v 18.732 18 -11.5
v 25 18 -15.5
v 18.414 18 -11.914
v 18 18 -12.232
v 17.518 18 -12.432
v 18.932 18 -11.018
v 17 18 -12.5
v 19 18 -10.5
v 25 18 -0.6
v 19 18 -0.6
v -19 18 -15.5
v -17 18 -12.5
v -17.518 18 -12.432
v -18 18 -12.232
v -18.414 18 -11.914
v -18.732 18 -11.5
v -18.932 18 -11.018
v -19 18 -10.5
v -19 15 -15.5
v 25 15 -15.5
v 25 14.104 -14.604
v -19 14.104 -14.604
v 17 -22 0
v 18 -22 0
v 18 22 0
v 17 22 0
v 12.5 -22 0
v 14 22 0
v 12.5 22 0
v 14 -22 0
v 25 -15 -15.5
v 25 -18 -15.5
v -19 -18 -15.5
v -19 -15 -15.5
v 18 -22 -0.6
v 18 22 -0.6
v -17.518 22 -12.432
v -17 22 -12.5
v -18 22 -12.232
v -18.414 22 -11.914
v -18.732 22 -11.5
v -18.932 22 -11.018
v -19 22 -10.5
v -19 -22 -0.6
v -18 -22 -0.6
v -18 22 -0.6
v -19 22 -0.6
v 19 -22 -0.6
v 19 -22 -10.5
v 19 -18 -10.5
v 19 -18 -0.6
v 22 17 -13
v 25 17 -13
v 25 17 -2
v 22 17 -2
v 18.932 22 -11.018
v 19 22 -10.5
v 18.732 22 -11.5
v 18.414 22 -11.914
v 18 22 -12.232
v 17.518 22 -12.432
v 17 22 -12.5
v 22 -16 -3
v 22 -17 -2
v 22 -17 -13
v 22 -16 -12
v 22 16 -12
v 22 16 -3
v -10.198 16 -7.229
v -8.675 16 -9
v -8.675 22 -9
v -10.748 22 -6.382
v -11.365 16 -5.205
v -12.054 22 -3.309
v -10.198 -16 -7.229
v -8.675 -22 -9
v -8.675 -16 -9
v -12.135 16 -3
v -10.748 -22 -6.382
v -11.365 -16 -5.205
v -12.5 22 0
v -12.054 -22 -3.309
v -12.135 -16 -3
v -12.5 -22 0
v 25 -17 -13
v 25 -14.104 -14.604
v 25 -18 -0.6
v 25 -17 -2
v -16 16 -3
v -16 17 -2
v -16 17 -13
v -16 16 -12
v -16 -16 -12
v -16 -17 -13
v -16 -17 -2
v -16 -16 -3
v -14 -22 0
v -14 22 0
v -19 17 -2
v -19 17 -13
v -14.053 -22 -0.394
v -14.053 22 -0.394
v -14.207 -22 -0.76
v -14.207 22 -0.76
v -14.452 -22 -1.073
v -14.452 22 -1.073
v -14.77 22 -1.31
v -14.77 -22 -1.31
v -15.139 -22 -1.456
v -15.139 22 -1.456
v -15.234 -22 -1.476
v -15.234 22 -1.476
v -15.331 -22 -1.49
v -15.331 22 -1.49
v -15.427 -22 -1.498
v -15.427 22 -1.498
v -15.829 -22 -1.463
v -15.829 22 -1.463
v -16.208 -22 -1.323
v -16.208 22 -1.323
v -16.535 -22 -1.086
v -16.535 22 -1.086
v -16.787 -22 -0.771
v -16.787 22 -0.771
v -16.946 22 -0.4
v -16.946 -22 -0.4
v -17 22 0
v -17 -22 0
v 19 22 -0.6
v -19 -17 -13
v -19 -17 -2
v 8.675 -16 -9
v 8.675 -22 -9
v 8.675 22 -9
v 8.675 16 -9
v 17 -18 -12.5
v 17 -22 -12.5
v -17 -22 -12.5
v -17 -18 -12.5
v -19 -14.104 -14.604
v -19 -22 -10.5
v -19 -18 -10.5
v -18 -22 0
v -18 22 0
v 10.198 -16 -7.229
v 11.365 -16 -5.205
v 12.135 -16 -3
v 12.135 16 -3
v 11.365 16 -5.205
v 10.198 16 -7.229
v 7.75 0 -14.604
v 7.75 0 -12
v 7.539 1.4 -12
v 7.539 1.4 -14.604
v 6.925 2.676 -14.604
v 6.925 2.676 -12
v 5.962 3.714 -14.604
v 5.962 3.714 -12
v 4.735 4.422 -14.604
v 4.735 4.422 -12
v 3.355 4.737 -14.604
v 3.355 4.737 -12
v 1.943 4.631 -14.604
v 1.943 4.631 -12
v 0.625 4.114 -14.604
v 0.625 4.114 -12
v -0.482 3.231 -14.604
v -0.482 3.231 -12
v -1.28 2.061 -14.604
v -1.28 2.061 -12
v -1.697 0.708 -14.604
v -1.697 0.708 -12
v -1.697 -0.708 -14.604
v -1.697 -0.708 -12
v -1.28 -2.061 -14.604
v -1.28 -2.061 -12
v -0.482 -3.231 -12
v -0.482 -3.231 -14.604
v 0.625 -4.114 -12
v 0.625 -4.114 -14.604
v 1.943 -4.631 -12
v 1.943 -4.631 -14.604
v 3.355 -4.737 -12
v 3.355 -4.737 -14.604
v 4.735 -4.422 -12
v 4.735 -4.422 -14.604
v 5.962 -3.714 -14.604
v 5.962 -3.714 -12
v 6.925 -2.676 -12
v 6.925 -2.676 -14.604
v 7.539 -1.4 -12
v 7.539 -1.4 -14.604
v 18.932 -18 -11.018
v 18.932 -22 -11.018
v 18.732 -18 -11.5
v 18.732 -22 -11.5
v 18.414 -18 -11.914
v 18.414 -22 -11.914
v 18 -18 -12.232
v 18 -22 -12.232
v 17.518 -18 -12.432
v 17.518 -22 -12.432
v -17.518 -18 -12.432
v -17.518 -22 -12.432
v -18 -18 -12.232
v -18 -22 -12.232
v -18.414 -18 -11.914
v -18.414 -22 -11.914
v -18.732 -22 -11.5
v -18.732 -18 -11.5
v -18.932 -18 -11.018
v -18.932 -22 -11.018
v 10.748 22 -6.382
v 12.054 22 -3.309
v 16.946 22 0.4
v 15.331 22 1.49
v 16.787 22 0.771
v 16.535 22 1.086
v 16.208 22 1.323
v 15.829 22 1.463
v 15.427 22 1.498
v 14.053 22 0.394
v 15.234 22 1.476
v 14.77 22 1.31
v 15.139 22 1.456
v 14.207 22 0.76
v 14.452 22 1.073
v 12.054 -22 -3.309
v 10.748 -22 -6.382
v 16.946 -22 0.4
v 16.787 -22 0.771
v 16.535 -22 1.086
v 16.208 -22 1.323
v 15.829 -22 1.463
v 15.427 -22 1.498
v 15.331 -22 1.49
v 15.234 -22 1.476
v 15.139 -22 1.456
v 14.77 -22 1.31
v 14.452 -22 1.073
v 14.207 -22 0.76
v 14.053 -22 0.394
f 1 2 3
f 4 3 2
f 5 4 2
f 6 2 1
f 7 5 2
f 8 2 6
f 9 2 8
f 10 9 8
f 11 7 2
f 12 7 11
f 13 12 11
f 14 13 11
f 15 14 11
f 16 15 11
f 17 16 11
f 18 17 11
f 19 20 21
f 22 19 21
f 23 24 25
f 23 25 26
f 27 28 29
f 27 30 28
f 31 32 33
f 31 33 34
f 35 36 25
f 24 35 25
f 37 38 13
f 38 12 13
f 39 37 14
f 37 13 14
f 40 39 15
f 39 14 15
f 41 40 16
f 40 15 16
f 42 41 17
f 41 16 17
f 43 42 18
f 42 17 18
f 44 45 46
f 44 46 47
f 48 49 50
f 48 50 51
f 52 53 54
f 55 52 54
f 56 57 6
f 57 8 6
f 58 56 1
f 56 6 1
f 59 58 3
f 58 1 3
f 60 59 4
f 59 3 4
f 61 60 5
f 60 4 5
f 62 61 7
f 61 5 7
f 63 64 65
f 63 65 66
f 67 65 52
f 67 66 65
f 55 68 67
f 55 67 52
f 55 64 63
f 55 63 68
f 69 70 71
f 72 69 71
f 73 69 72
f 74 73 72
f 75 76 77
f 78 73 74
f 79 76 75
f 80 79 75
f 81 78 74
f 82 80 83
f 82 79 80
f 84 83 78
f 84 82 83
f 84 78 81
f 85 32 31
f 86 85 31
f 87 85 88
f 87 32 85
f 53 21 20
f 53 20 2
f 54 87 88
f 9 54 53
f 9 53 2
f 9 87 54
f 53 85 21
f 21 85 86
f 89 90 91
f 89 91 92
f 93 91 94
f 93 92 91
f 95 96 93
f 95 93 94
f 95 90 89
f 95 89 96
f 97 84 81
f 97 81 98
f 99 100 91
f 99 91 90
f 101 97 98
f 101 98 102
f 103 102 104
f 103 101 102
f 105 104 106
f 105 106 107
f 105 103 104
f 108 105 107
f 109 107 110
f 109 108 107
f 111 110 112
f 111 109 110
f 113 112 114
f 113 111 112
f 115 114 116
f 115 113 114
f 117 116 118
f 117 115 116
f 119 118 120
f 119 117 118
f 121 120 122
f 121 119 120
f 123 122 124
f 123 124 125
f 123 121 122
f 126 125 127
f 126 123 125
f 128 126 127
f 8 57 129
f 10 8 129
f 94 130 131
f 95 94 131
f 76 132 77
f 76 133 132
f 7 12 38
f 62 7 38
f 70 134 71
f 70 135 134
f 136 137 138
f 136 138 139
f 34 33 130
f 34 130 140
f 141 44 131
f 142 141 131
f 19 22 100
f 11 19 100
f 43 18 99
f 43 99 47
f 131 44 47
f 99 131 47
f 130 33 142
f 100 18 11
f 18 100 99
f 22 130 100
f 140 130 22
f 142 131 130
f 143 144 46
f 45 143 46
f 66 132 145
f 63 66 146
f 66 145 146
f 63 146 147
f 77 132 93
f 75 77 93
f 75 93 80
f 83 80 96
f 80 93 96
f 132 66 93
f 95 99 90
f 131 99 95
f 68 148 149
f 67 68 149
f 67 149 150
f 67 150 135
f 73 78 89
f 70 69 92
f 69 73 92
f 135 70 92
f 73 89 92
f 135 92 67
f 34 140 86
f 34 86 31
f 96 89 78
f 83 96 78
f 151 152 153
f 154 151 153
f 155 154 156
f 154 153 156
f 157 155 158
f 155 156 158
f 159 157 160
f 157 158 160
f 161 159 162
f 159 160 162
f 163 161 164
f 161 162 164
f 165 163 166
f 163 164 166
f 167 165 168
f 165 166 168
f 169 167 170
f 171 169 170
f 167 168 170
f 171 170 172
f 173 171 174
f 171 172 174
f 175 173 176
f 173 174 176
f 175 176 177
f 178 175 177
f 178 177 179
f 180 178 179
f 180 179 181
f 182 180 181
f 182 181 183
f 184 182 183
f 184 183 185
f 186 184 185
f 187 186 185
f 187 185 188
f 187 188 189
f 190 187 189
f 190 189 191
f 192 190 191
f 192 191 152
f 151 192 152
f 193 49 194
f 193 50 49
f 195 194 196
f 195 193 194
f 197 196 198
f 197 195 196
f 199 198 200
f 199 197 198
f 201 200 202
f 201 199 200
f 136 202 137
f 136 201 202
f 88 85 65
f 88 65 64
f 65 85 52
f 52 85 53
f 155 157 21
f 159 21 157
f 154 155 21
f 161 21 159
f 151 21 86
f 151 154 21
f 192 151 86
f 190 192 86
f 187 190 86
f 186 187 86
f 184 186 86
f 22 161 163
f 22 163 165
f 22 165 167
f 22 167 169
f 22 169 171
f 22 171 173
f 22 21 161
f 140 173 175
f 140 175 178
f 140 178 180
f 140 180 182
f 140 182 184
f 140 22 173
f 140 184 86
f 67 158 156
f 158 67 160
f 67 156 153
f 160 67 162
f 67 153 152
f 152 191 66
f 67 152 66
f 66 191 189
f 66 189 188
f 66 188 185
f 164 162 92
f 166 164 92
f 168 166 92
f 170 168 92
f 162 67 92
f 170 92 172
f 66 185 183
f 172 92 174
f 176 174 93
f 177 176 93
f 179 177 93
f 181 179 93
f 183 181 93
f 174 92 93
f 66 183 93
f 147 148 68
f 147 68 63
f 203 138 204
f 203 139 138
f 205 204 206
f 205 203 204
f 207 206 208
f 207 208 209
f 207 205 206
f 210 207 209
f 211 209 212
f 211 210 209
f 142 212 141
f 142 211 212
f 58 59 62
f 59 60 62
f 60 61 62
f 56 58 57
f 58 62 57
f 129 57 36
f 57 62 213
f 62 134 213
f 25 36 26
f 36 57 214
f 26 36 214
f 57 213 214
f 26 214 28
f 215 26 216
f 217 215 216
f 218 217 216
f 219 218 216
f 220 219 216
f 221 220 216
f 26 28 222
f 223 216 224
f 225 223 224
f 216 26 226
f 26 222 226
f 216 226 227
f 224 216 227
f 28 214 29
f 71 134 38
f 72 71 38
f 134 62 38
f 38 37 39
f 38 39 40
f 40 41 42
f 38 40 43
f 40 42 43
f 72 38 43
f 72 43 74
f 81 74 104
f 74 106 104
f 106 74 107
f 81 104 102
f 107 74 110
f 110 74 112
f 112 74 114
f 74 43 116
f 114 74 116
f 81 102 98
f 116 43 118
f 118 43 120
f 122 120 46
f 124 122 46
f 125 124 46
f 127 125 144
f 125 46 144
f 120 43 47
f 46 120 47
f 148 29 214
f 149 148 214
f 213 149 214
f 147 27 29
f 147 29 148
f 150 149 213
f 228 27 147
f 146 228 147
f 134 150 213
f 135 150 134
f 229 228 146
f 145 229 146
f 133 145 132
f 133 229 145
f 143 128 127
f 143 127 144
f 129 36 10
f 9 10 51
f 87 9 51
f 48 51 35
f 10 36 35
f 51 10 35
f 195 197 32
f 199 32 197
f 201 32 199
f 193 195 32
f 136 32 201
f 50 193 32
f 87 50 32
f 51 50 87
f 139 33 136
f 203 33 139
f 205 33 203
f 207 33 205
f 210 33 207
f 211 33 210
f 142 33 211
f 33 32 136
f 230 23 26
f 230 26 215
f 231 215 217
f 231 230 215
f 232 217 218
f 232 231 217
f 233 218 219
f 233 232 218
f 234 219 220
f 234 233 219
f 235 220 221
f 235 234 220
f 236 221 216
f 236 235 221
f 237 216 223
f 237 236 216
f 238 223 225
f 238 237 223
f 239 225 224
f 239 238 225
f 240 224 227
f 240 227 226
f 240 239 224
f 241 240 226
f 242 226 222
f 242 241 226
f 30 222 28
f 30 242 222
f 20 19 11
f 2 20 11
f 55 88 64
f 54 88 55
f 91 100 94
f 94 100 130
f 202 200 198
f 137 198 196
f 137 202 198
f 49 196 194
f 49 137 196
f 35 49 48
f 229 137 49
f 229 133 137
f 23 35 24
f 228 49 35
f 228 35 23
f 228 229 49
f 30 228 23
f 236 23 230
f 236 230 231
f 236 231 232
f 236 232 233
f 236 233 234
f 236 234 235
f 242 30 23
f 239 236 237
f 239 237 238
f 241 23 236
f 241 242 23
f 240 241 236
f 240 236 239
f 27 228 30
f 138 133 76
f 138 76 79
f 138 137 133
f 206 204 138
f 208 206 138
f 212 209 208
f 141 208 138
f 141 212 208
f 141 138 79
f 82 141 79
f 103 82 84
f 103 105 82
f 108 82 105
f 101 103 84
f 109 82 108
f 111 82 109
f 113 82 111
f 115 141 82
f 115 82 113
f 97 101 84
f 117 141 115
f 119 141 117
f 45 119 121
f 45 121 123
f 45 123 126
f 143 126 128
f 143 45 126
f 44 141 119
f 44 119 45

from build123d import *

# Parameters (mm, degrees)
F3_DEPTH     = 22
F0_R         = 4.75
F4_DEPTH     = 25
F2_W         = 6
F2_H         = 3
F5_DEPTH     = 19
F6_W         = 60
F6_H         = 32
F7_DEPTH     = 3
F8_DEPTH     = 3
F9_DEPTH     = 3
F10_DEPTH    = 3
F11_DEPTH    = 6
F12_W        = 34
F12_H        = 11
F12_W_2      = 32
F12_H_2      = 9
F13_DEPTH    = 3
F14_W        = 34
F14_H        = 11
F14_W_2      = 32
F14_H_2      = 9
F15_DEPTH    = 3
F2_W_2       = 4
F16_DEPTH    = 25
F17_T4_DEPTH = 59.4300979278
F17_T9_DEPTH = 59.4300979278
F18_W        = 6
F18_H        = 11.9
F19_DEPTH    = 4
F20_W        = 6
F20_H        = 11.9
F21_DEPTH    = 4
F22_R        = 2


# Not quite as in the source:
# - a fillet or chamfer that OpenCascade refuses, or shapes differently, is made with other operations: its cross-section is extruded or revolved along the edge and cut away or added


with BuildPart() as f3:
    # F1 (on Front) → F3 (new body, symmetric)
    with BuildSketch(Plane.XZ):
        with BuildLine():
            Line((14, 0), (12.5, 0))
            ThreePointArc((12.5, 0), (11.5039872942, -4.8896090165), (8.6746757864, -9))
            Line((8.6746757864, -9), (12.6194294641, -9))
            ThreePointArc((12.6194294641, -9), (14.1666094691, -6.2894495904), (15.139409409, -3.3238957184))
            Line((15.139409409, -3.3238957184), (15.139409409, -1.4560131956))
            ThreePointArc((15.139409409, -1.4560131956), (14.318711321, -0.9244225531), (14, 0))
        make_face()
        with BuildLine():
            Line((8.6746757864, -9), (3.0413812651, -9))
            ThreePointArc((3.0413812651, -9), (0, -9.5), (-3.0413812651, -9))
            Line((-3.0413812651, -9), (-8.6746757864, -9))
            ThreePointArc((-8.6746757864, -9), (0, -12.5), (8.6746757864, -9))
        make_face()
        with BuildLine():
            ThreePointArc((-3.0413812651, -9), (0, -9.5), (3.0413812651, -9))
            Line((3.0413812651, -9), (-3.0413812651, -9))
        make_face()
        with BuildLine():
            Line((12.6194294641, -9), (8.6746757864, -9))
            ThreePointArc((8.6746757864, -9), (0, -12.5), (-8.6746757864, -9))
            Line((-8.6746757864, -9), (-12.6194294641, -9))
            ThreePointArc((-12.6194294641, -9), (-10.9697184602, -10.9505834047), (-9.0220182155, -12.603697367))
            Line((-9.0220182155, -12.603697367), (9.0220182155, -12.603697367))
            ThreePointArc((9.0220182155, -12.603697367), (10.9697184602, -10.9505834047), (12.6194294641, -9))
        make_face()
        with BuildLine():
            ThreePointArc((15.139409409, 1.4560131956), (14.318711321, 0.9244225531), (14, 0))
            Line((14, 0), (15.139409409, 0))
            Line((15.139409409, 0), (15.139409409, 1.4560131956))
        make_face()
        with BuildLine():
            Line((15.139409409, 0), (14, 0))
            ThreePointArc((14, 0), (14.318711321, -0.9244225531), (15.139409409, -1.4560131956))
            Line((15.139409409, -1.4560131956), (15.139409409, 0))
        make_face()
        with BuildLine():
            ThreePointArc((-8.6746757864, -9), (-11.5039872942, -4.8896090165), (-12.5, 0))
            Line((-12.5, 0), (-14, 0))
            ThreePointArc((-14, 0), (-14.318711321, -0.9244225531), (-15.139409409, -1.4560131956))
            Line((-15.139409409, -1.4560131956), (-15.139409409, -3.3238957184))
            ThreePointArc((-15.139409409, -3.3238957184), (-14.1666094691, -6.2894495904), (-12.6194294641, -9))
            Line((-12.6194294641, -9), (-8.6746757864, -9))
        make_face()
        with BuildLine():
            ThreePointArc((15.139409409, -3.3238957184), (14.1666094691, -6.2894495904), (12.6194294641, -9))
            Line((12.6194294641, -9), (15.139409409, -9))
            Line((15.139409409, -9), (15.139409409, -3.3238957184))
        make_face()
        with BuildLine():
            Line((15.139409409, -9), (12.6194294641, -9))
            ThreePointArc((12.6194294641, -9), (10.9697184602, -10.9505834047), (9.0220182155, -12.603697367))
            Line((9.0220182155, -12.603697367), (14.2178343175, -12.603697367))
            ThreePointArc((14.2178343175, -12.603697367), (15.5800609184, -10.8748196205), (16.7332005307, -9))
            Line((16.7332005307, -9), (15.139409409, -9))
        make_face()
        with BuildLine():
            Line((15.5, 0), (15.139409409, 0))
            Line((15.139409409, 0), (15.139409409, -1.4560131956))
            ThreePointArc((15.139409409, -1.4560131956), (15.2823875721, -1.484131002), (15.4274193548, -1.4982429876))
            ThreePointArc((15.4274193548, -1.4982429876), (15.4818442054, -0.75), (15.5, 0))
        make_face()
        with BuildLine():
            Line((15.139409409, 1.4560131956), (15.139409409, 0))
            Line((15.139409409, 0), (15.5, 0))
            ThreePointArc((15.5, 0), (15.4818442054, 0.75), (15.4274193548, 1.4982429876))
            ThreePointArc((15.4274193548, 1.4982429876), (15.2823875721, 1.484131002), (15.139409409, 1.4560131956))
        make_face()
        with BuildLine():
            ThreePointArc((15.4274193548, -1.4982429876), (15.2823875721, -1.484131002), (15.139409409, -1.4560131956))
            Line((15.139409409, -1.4560131956), (15.139409409, -3.3238957184))
            ThreePointArc((15.139409409, -3.3238957184), (15.3106501215, -2.4153659883), (15.4274193548, -1.4982429876))
        make_face()
        with BuildLine():
            ThreePointArc((-9.0220182155, -12.603697367), (-10.9697184602, -10.9505834047), (-12.6194294641, -9))
            Line((-12.6194294641, -9), (-15.139409409, -9))
            Line((-15.139409409, -9), (-16.7332005307, -9))
            ThreePointArc((-16.7332005307, -9), (-15.5800609184, -10.8748196205), (-14.2178343175, -12.603697367))
            Line((-14.2178343175, -12.603697367), (-9.0220182155, -12.603697367))
        make_face()
        with BuildLine():
            Line((-15.139409409, -9), (-12.6194294641, -9))
            ThreePointArc((-12.6194294641, -9), (-14.1666094691, -6.2894495904), (-15.139409409, -3.3238957184))
            Line((-15.139409409, -3.3238957184), (-15.139409409, -9))
        make_face()
        with BuildLine():
            Line((15.139409409, -3.3238957184), (15.139409409, -9))
            Line((15.139409409, -9), (16.7332005307, -9))
            ThreePointArc((16.7332005307, -9), (18.3490087673, -4.9309103884), (18.9905239528, -0.6))
            Line((18.9905239528, -0.6), (18, -0.6))
            Line((18, -0.6), (18, 0))
            Line((18, 0), (17, 0))
            ThreePointArc((17, 0), (16.5346808765, -1.0860181784), (15.4274193548, -1.4982429876))
            ThreePointArc((15.4274193548, -1.4982429876), (15.3106501215, -2.4153659883), (15.139409409, -3.3238957184))
        make_face()
        with BuildLine():
            ThreePointArc((5.1944223175, -14.603697367), (7.1782167254, -13.7376564465), (9.0220182155, -12.603697367))
            Line((9.0220182155, -12.603697367), (-9.0220182155, -12.603697367))
            ThreePointArc((-9.0220182155, -12.603697367), (-7.1782167254, -13.7376564465), (-5.1944223175, -14.603697367))
            Line((-5.1944223175, -14.603697367), (5.1944223175, -14.603697367))
        make_face()
        with BuildLine():
            Line((14.2178343175, -12.603697367), (9.0220182155, -12.603697367))
            ThreePointArc((9.0220182155, -12.603697367), (7.1782167254, -13.7376564465), (5.1944223175, -14.603697367))
            Line((5.1944223175, -14.603697367), (12.1545062924, -14.603697367))
            ThreePointArc((12.1545062924, -14.603697367), (13.2240344567, -13.6427604497), (14.2178343175, -12.603697367))
        make_face()
        with BuildLine():
            Line((17, 0), (15.5, 0))
            ThreePointArc((15.5, 0), (15.4818442054, -0.75), (15.4274193548, -1.4982429876))
            ThreePointArc((15.4274193548, -1.4982429876), (16.5346808765, -1.0860181784), (17, 0))
        make_face()
        with BuildLine():
            ThreePointArc((15.4274193548, 1.4982429876), (15.4818442054, 0.75), (15.5, 0))
            Line((15.5, 0), (17, 0))
            ThreePointArc((17, 0), (16.5346808765, 1.0860181784), (15.4274193548, 1.4982429876))
        make_face()
        with BuildLine():
            Line((-15.139409409, -3.3238957184), (-15.139409409, -1.4560131956))
            ThreePointArc((-15.139409409, -1.4560131956), (-15.2823875721, -1.484131002), (-15.4274193548, -1.4982429876))
            ThreePointArc((-15.4274193548, -1.4982429876), (-15.3106501215, -2.4153659883), (-15.139409409, -3.3238957184))
        make_face()
        with BuildLine():
            Line((-16.7332005307, -9), (-15.139409409, -9))
            Line((-15.139409409, -9), (-15.139409409, -3.3238957184))
            ThreePointArc((-15.139409409, -3.3238957184), (-15.3106501215, -2.4153659883), (-15.4274193548, -1.4982429876))
            ThreePointArc((-15.4274193548, -1.4982429876), (-16.5346808765, -1.0860181784), (-17, 0))
            Line((-17, 0), (-18, 0))
            Line((-18, 0), (-18, -0.6))
            Line((-18, -0.6), (-18.9905239528, -0.6))
            ThreePointArc((-18.9905239528, -0.6), (-18.3490087673, -4.9309103884), (-16.7332005307, -9))
        make_face()
        with BuildLine():
            ThreePointArc((-5.1944223175, -14.603697367), (-7.1782167254, -13.7376564465), (-9.0220182155, -12.603697367))
            Line((-9.0220182155, -12.603697367), (-14.2178343175, -12.603697367))
            ThreePointArc((-14.2178343175, -12.603697367), (-13.2240344567, -13.6427604497), (-12.1545062924, -14.603697367))
            Line((-12.1545062924, -14.603697367), (-5.1944223175, -14.603697367))
        make_face()
        with BuildLine():
            ThreePointArc((18.9905239528, -0.6), (18.3490087673, -4.9309103884), (16.7332005307, -9))
            Line((16.7332005307, -9), (19, -9))
            Line((19, -9), (19, -0.6))
            Line((19, -0.6), (18.9905239528, -0.6))
        make_face()
        with BuildLine():
            Line((19, -9), (16.7332005307, -9))
            ThreePointArc((16.7332005307, -9), (15.5800609184, -10.8748196205), (14.2178343175, -12.603697367))
            Line((14.2178343175, -12.603697367), (19, -12.603697367))
            Line((19, -12.603697367), (19, -9))
        make_face()
        with BuildLine():
            Line((19, -12.603697367), (14.2178343175, -12.603697367))
            ThreePointArc((14.2178343175, -12.603697367), (13.2240344567, -13.6427604497), (12.1545062924, -14.603697367))
            Line((12.1545062924, -14.603697367), (19, -14.603697367))
            Line((19, -14.603697367), (19, -12.603697367))
        make_face()
        with BuildLine():
            ThreePointArc((-14.2178343175, -12.603697367), (-15.5800609184, -10.8748196205), (-16.7332005307, -9))
            Line((-16.7332005307, -9), (-19, -9))
            Line((-19, -9), (-19, -12.603697367))
            Line((-19, -12.603697367), (-14.2178343175, -12.603697367))
        make_face()
        with BuildLine():
            Line((-19, -9), (-16.7332005307, -9))
            ThreePointArc((-16.7332005307, -9), (-18.3490087673, -4.9309103884), (-18.9905239528, -0.6))
            Line((-18.9905239528, -0.6), (-19, -0.6))
            Line((-19, -0.6), (-19, -9))
        make_face()
        with BuildLine():
            ThreePointArc((-12.1545062924, -14.603697367), (-13.2240344567, -13.6427604497), (-14.2178343175, -12.603697367))
            Line((-14.2178343175, -12.603697367), (-19, -12.603697367))
            Line((-19, -12.603697367), (-19, -14.603697367))
            Line((-19, -14.603697367), (-12.1545062924, -14.603697367))
        make_face()
    extrude(amount=F3_DEPTH, both=True)

    # F0 (on Top) → F4 (cut)
    with BuildSketch(Plane.XY):
        with Locations((3, 0)):
            Circle(F0_R)
    extrude(amount=-F4_DEPTH, mode=Mode.SUBTRACT)

    # F2 (on Right) → F5 (join, symmetric)
    with BuildSketch(Plane.YZ):
        with Locations((-15, -14)):
            Rectangle(F2_W, F2_H)
        with Locations((15, -14)):
            Rectangle(F2_W, F2_H)
    extrude(amount=F5_DEPTH, both=True)

    # F6 (on face) → F7 (cut)
    with BuildSketch(Plane.XY.offset(-9)):
        with Locations((3, 0)):
            Rectangle(F6_W, F6_H)
    extrude(amount=-F7_DEPTH, mode=Mode.SUBTRACT)

    # F6 (on face) → F8 (cut)
    with BuildSketch(Plane.XY.offset(-9)):
        with Locations((3, 0)):
            Rectangle(F6_W, F6_H)
    extrude(amount=F8_DEPTH, mode=Mode.SUBTRACT)

    # F9 (cut): a face of the model
    f9_faces = [f3.faces().sort_by_distance(p)[0] for p in [
        (-14.9829280499, 0, -6),
    ]]
    extrude(f9_faces, amount=-F9_DEPTH, mode=Mode.SUBTRACT)

    # F10 (cut): a face of the model
    f10_faces = [f3.faces().sort_by_distance(p)[0] for p in [
        (14.9829280499, 0, -6),
    ]]
    extrude(f10_faces, amount=-F10_DEPTH, mode=Mode.SUBTRACT)

    # F11 (add): a face of the model
    f11_faces = [f3.faces().sort_by_distance(p)[0] for p in [
        (19, 20, -14.1391535047),
    ]]
    extrude(f11_faces, amount=F11_DEPTH)

    # F12 (on face) → F13 (cut)
    with BuildSketch(Plane.YZ.offset(25)):
        with Locations((0, -7.5)):
            Rectangle(F12_W, F12_H)
        with Locations((0, -7.5)):
            Rectangle(F12_W_2, F12_H_2, mode=Mode.SUBTRACT)
    extrude(amount=-F13_DEPTH, mode=Mode.SUBTRACT)

    # F14 (on face) → F15 (cut)
    with BuildSketch(Plane(origin=(-19, 0, 0), x_dir=(0, -1, 0), z_dir=(-1, 0, 0))):
        with Locations((0, -7.5)):
            Rectangle(F14_W, F14_H)
        with Locations((0, -7.5)):
            Rectangle(F14_W_2, F14_H_2, mode=Mode.SUBTRACT)
    extrude(amount=-F15_DEPTH, mode=Mode.SUBTRACT)

    # F2 (on Right) → F16 (cut, symmetric)
    with BuildSketch(Plane.YZ):
        with Locations((20, -14)):
            Rectangle(F2_W_2, F2_H)
        with Locations((-20, -14)):
            Rectangle(F2_W_2, F2_H)
    extrude(amount=F16_DEPTH, both=True, mode=Mode.SUBTRACT)

    # F17: chamfer of 3 on 2 edges, made by hand


with BuildPart() as f17_tool2:
    # F17_s3 → F17_t4 (new body)
    with BuildSketch(Plane.YZ.offset(32.7150489639)):
        Polygon((15, -15.5), (12, -12.5), (12, -15.5), align=None)
    extrude(amount=-F17_T4_DEPTH)

    split(bisect_by=Plane.XY.offset(-14.603697367), keep=Keep.BOTTOM)


with BuildPart() as f3_1:
    add(f3.part)

    # F17_t1: cut F17_tool2
    add(f17_tool2.part, mode=Mode.SUBTRACT)


with BuildPart() as f17_tool7:
    # F17_s8 → F17_t9 (new body)
    with BuildSketch(Plane.YZ.offset(32.7150489639)):
        Polygon((-12, -12.5), (-15, -15.5), (-12, -15.5), align=None)
    extrude(amount=-F17_T9_DEPTH)

    split(bisect_by=Plane.XY.offset(-14.603697367), keep=Keep.BOTTOM)


with BuildPart() as f3_2:
    add(f3_1.part)

    # F17_t6: cut F17_tool7
    add(f17_tool7.part, mode=Mode.SUBTRACT)

    # F18 (on face) → F19 (cut)
    with BuildSketch(Plane.XZ.offset(22)):
        with Locations((22, -6.55)):
            Rectangle(F18_W, F18_H)
    extrude(amount=-F19_DEPTH, mode=Mode.SUBTRACT)

    # F20 (on face) → F21 (cut)
    with BuildSketch(Plane(origin=(0, 22, 0), x_dir=(-1, 0, 0), z_dir=(0, 1, 0))):
        with Locations((-22, -6.55)):
            Rectangle(F20_W, F20_H)
    extrude(amount=-F21_DEPTH, mode=Mode.SUBTRACT)

    # F22
    f22_edges = [f3_2.edges().sort_by_distance(p)[0] for p in [
        (-19, 20, -12.5),
        (19, -20, -12.5),
        (19, 20, -12.5),
        (-19, -20, -12.5),
    ]]
    fillet(f22_edges, radius=F22_R)


solid = f3_2.part
